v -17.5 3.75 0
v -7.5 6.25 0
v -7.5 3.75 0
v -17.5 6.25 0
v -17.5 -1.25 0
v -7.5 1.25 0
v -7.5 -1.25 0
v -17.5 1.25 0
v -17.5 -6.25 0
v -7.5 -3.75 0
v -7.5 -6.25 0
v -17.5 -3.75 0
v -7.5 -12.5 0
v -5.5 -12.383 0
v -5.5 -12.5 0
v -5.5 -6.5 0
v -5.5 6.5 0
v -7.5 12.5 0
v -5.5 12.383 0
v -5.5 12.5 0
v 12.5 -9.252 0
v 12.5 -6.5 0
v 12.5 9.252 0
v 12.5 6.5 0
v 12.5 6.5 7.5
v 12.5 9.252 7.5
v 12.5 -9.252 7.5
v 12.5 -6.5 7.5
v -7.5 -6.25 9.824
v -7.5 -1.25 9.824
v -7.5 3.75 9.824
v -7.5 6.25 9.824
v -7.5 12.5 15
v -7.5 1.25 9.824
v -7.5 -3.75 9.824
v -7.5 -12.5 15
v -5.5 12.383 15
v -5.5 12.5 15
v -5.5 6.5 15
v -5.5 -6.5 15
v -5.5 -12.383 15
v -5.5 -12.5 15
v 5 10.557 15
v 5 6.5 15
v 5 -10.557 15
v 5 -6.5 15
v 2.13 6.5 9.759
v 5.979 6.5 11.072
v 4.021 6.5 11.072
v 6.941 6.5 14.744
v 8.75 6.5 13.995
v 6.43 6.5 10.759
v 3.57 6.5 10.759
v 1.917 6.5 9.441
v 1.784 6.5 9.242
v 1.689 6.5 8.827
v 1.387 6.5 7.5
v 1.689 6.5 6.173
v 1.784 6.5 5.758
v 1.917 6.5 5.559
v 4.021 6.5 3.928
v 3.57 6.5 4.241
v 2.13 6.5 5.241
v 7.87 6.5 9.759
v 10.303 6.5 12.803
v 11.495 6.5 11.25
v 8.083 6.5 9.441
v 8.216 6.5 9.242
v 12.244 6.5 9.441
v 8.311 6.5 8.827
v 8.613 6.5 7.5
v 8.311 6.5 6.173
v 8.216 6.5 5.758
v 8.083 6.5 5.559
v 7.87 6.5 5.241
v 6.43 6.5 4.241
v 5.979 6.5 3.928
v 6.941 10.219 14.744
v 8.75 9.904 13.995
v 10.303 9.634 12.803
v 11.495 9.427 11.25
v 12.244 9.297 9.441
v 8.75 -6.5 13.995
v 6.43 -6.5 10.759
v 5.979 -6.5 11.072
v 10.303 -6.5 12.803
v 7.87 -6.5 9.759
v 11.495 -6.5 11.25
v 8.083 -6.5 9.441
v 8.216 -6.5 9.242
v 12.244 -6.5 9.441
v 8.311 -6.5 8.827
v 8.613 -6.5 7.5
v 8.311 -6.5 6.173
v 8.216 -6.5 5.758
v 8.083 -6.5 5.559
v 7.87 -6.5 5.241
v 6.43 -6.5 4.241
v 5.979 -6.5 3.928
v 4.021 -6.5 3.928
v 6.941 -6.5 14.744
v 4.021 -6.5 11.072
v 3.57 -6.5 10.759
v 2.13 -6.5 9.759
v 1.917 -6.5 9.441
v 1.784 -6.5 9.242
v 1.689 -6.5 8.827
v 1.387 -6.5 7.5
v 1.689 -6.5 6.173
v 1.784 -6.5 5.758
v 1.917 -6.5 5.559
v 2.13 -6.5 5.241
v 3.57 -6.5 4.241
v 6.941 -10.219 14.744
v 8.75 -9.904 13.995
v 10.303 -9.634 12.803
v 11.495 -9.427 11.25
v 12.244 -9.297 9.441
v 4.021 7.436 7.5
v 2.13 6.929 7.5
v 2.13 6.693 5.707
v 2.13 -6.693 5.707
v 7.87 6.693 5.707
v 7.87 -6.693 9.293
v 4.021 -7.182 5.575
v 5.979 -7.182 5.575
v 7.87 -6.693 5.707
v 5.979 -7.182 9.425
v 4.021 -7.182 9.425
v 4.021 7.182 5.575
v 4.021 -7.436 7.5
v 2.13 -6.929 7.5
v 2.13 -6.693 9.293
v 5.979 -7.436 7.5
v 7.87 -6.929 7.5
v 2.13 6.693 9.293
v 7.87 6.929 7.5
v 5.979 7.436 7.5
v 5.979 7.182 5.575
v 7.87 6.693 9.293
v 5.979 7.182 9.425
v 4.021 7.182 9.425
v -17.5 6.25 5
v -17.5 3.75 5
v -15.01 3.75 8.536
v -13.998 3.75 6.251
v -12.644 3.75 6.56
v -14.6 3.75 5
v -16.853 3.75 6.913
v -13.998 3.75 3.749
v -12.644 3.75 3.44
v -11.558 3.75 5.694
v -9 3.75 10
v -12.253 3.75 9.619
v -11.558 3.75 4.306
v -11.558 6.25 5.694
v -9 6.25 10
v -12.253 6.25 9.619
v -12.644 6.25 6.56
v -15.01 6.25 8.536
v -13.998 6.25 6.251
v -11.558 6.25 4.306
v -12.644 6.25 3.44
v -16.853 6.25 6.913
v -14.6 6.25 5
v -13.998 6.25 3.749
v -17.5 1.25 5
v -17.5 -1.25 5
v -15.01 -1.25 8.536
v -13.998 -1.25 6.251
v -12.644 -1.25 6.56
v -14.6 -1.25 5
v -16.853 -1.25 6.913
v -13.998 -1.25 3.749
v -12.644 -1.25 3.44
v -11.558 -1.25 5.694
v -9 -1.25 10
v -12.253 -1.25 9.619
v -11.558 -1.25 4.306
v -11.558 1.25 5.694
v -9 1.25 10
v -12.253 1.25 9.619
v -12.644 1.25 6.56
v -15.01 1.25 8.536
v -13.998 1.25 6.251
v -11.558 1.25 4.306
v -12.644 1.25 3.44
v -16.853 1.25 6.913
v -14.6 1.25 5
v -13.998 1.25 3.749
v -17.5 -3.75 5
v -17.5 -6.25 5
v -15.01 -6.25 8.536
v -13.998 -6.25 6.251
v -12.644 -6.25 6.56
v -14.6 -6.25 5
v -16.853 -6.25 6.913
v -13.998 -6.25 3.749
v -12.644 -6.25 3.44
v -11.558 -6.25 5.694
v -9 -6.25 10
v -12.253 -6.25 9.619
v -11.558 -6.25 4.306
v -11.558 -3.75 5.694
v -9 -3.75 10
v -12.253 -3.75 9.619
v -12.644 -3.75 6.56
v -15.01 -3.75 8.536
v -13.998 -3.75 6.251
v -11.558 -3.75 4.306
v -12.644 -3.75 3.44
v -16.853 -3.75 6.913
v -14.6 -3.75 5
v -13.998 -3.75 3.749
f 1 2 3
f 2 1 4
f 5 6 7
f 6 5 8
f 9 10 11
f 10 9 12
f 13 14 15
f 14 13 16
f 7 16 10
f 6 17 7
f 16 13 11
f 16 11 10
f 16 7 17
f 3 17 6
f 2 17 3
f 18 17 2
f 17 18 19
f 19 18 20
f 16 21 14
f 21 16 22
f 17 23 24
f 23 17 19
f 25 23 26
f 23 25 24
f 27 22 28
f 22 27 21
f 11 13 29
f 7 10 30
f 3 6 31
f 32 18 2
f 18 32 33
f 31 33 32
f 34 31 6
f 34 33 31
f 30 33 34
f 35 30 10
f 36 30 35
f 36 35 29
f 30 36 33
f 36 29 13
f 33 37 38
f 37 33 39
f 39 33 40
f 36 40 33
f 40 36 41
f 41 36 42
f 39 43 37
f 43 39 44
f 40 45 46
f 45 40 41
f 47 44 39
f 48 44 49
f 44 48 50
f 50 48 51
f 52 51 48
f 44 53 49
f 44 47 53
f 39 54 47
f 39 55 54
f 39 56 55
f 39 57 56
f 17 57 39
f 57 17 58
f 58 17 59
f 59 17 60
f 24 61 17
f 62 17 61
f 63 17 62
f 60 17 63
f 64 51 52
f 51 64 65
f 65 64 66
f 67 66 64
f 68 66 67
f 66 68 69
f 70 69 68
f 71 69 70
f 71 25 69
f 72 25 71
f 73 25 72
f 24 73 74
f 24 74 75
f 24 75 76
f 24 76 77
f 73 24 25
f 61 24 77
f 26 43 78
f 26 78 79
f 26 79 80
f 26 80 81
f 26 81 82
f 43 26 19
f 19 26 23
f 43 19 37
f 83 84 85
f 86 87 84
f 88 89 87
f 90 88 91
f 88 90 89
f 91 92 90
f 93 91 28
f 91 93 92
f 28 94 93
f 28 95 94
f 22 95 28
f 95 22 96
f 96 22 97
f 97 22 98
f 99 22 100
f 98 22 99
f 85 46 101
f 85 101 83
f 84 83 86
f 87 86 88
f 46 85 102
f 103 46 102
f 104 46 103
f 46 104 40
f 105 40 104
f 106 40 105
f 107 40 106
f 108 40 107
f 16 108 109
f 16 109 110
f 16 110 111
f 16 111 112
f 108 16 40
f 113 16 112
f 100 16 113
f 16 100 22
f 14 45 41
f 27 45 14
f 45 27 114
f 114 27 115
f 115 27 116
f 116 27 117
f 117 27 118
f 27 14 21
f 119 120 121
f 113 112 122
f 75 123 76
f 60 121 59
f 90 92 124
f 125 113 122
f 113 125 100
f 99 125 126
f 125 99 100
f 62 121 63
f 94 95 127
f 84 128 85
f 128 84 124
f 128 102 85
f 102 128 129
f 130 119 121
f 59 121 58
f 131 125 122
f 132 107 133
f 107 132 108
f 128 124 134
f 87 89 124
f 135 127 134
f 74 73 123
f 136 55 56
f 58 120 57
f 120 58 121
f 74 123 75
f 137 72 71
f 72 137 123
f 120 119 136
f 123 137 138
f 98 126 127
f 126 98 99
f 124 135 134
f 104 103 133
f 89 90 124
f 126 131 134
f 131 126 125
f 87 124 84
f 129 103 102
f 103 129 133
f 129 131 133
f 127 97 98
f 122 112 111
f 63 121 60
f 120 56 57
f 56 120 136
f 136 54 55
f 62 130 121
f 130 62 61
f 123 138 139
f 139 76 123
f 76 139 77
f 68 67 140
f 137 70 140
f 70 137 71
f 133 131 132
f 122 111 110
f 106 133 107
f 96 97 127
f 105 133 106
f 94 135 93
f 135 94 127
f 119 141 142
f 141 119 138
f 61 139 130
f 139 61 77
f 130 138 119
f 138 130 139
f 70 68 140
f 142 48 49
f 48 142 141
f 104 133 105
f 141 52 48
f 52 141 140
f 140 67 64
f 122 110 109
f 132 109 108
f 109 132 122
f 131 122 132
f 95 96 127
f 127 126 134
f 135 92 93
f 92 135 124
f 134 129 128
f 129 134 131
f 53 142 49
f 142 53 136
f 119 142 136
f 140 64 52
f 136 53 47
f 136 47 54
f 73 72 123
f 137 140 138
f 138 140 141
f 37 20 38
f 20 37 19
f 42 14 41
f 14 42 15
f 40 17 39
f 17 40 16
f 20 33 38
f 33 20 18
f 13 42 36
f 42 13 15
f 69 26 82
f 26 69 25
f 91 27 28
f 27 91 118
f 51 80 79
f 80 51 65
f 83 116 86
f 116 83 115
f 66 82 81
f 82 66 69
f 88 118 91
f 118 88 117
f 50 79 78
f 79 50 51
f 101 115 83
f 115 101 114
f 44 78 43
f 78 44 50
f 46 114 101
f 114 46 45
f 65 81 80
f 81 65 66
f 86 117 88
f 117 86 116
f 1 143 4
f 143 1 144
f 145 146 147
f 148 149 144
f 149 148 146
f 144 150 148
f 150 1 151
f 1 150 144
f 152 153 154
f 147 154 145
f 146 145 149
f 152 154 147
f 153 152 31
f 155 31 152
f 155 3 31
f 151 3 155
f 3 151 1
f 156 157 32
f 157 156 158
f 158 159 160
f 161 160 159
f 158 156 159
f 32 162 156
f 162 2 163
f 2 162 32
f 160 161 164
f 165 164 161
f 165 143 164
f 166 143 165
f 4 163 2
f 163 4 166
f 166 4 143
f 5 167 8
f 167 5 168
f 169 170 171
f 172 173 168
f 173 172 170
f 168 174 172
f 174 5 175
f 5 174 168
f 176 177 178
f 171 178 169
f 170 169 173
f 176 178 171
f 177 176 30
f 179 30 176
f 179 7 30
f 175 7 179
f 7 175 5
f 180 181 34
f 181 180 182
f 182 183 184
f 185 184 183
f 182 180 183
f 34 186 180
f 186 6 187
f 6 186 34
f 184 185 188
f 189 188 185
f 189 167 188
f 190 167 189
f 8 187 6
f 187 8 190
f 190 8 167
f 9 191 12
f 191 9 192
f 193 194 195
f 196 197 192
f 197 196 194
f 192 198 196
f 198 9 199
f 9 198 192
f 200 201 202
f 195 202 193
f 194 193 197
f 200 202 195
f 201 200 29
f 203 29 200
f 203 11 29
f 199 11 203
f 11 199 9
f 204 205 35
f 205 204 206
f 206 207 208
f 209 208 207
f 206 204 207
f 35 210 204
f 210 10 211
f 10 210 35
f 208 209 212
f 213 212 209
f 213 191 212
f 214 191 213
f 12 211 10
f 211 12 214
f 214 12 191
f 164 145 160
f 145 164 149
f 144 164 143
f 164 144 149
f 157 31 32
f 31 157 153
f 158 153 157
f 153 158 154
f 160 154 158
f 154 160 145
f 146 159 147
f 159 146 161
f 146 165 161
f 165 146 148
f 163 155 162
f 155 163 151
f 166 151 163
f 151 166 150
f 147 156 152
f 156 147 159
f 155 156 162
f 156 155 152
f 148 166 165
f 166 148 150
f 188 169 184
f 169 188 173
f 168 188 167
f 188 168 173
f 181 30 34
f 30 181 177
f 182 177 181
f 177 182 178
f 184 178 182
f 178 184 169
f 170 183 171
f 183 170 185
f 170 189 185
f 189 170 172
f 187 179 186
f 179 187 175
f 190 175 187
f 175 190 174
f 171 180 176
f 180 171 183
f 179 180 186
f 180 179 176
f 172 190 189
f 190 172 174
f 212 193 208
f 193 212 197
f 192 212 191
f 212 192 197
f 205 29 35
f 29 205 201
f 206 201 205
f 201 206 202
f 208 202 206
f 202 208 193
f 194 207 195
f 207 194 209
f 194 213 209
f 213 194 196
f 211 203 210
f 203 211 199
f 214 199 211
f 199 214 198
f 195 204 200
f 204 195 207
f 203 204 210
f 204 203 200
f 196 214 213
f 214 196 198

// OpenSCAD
// file: connector.scad
module connector(w=2.5) {
  translate([1.5, w, 5])
  difference() {
    rotate([90])
      scale([1.7,1])
      cylinder(r=5, h=w);
    rotate([90])
      translate([4,0])
      cylinder(r=1.6, h=w, $fn=7);
    translate([-11.5, -3, -5])
    cube([10,4,10]);
  }
}

module connectors() {
  connector();
  translate([0, 5]) connector();
  translate([0, 10]) connector();
}

connector();
// main file
use <connector.scad>;

radius = 7.5;
wall = 2;
diameter = radius * 2;
base = diameter;
width = base + 10;
ballHeight = 5;
inset = 1;
eps = 0.1;

translate([-base/2, 0, base/2]) rotate([0, 90, 0]) intersection() {
	Main();
	HalfCylinder();
}

rotate([0, 0, 180]) translate([base/2,-width/4,0]) SocketConnector();

module Side() {
	translate([-base / 2, diameter / 2 - inset, 0]) union() {
		cube([base, wall, base + ballHeight]);
		translate([base, -eps, -eps]) Rampart();
	}
}

module Rampart() {
	rotate([0, -90, 0]) linear_extrude(height = base) {
		polygon([ [wall, wall], [wall, 6], [width, wall] ], [ [0, 1, 2] ]);
	}
}

module Main() {
	translate([-base / 2, -width / 2, 0])
		cube([base, width , 2]);

	difference() {
		union() {
			Side();
			rotate([0, 0, 180]) Side();
		}
		translate([0, 0, base / 2 + ballHeight]) {
			sphere(radius);
		}
	}
}

module HalfCylinder() {
	translate([0, width/2, diameter/2 + ballHeight]) {
		rotate([90, 0, 0]) cylinder(h = width, r=radius);
	}
	translate([-base/2, -width/2, 0]) {
		cube([base, width, diameter/2 + ballHeight]);
	}
	translate([0, -width/2, 0]) {
		cube([base/2, width, diameter + ballHeight]);
	}
}

module base() {
	cube([10,2.5,3]);
	translate([8,0]) cube([2,2.5,5]);
}

module SocketConnector() {
	base();
	translate([0,5]) base();
	translate([0,10]) base();
	connectors();
}
